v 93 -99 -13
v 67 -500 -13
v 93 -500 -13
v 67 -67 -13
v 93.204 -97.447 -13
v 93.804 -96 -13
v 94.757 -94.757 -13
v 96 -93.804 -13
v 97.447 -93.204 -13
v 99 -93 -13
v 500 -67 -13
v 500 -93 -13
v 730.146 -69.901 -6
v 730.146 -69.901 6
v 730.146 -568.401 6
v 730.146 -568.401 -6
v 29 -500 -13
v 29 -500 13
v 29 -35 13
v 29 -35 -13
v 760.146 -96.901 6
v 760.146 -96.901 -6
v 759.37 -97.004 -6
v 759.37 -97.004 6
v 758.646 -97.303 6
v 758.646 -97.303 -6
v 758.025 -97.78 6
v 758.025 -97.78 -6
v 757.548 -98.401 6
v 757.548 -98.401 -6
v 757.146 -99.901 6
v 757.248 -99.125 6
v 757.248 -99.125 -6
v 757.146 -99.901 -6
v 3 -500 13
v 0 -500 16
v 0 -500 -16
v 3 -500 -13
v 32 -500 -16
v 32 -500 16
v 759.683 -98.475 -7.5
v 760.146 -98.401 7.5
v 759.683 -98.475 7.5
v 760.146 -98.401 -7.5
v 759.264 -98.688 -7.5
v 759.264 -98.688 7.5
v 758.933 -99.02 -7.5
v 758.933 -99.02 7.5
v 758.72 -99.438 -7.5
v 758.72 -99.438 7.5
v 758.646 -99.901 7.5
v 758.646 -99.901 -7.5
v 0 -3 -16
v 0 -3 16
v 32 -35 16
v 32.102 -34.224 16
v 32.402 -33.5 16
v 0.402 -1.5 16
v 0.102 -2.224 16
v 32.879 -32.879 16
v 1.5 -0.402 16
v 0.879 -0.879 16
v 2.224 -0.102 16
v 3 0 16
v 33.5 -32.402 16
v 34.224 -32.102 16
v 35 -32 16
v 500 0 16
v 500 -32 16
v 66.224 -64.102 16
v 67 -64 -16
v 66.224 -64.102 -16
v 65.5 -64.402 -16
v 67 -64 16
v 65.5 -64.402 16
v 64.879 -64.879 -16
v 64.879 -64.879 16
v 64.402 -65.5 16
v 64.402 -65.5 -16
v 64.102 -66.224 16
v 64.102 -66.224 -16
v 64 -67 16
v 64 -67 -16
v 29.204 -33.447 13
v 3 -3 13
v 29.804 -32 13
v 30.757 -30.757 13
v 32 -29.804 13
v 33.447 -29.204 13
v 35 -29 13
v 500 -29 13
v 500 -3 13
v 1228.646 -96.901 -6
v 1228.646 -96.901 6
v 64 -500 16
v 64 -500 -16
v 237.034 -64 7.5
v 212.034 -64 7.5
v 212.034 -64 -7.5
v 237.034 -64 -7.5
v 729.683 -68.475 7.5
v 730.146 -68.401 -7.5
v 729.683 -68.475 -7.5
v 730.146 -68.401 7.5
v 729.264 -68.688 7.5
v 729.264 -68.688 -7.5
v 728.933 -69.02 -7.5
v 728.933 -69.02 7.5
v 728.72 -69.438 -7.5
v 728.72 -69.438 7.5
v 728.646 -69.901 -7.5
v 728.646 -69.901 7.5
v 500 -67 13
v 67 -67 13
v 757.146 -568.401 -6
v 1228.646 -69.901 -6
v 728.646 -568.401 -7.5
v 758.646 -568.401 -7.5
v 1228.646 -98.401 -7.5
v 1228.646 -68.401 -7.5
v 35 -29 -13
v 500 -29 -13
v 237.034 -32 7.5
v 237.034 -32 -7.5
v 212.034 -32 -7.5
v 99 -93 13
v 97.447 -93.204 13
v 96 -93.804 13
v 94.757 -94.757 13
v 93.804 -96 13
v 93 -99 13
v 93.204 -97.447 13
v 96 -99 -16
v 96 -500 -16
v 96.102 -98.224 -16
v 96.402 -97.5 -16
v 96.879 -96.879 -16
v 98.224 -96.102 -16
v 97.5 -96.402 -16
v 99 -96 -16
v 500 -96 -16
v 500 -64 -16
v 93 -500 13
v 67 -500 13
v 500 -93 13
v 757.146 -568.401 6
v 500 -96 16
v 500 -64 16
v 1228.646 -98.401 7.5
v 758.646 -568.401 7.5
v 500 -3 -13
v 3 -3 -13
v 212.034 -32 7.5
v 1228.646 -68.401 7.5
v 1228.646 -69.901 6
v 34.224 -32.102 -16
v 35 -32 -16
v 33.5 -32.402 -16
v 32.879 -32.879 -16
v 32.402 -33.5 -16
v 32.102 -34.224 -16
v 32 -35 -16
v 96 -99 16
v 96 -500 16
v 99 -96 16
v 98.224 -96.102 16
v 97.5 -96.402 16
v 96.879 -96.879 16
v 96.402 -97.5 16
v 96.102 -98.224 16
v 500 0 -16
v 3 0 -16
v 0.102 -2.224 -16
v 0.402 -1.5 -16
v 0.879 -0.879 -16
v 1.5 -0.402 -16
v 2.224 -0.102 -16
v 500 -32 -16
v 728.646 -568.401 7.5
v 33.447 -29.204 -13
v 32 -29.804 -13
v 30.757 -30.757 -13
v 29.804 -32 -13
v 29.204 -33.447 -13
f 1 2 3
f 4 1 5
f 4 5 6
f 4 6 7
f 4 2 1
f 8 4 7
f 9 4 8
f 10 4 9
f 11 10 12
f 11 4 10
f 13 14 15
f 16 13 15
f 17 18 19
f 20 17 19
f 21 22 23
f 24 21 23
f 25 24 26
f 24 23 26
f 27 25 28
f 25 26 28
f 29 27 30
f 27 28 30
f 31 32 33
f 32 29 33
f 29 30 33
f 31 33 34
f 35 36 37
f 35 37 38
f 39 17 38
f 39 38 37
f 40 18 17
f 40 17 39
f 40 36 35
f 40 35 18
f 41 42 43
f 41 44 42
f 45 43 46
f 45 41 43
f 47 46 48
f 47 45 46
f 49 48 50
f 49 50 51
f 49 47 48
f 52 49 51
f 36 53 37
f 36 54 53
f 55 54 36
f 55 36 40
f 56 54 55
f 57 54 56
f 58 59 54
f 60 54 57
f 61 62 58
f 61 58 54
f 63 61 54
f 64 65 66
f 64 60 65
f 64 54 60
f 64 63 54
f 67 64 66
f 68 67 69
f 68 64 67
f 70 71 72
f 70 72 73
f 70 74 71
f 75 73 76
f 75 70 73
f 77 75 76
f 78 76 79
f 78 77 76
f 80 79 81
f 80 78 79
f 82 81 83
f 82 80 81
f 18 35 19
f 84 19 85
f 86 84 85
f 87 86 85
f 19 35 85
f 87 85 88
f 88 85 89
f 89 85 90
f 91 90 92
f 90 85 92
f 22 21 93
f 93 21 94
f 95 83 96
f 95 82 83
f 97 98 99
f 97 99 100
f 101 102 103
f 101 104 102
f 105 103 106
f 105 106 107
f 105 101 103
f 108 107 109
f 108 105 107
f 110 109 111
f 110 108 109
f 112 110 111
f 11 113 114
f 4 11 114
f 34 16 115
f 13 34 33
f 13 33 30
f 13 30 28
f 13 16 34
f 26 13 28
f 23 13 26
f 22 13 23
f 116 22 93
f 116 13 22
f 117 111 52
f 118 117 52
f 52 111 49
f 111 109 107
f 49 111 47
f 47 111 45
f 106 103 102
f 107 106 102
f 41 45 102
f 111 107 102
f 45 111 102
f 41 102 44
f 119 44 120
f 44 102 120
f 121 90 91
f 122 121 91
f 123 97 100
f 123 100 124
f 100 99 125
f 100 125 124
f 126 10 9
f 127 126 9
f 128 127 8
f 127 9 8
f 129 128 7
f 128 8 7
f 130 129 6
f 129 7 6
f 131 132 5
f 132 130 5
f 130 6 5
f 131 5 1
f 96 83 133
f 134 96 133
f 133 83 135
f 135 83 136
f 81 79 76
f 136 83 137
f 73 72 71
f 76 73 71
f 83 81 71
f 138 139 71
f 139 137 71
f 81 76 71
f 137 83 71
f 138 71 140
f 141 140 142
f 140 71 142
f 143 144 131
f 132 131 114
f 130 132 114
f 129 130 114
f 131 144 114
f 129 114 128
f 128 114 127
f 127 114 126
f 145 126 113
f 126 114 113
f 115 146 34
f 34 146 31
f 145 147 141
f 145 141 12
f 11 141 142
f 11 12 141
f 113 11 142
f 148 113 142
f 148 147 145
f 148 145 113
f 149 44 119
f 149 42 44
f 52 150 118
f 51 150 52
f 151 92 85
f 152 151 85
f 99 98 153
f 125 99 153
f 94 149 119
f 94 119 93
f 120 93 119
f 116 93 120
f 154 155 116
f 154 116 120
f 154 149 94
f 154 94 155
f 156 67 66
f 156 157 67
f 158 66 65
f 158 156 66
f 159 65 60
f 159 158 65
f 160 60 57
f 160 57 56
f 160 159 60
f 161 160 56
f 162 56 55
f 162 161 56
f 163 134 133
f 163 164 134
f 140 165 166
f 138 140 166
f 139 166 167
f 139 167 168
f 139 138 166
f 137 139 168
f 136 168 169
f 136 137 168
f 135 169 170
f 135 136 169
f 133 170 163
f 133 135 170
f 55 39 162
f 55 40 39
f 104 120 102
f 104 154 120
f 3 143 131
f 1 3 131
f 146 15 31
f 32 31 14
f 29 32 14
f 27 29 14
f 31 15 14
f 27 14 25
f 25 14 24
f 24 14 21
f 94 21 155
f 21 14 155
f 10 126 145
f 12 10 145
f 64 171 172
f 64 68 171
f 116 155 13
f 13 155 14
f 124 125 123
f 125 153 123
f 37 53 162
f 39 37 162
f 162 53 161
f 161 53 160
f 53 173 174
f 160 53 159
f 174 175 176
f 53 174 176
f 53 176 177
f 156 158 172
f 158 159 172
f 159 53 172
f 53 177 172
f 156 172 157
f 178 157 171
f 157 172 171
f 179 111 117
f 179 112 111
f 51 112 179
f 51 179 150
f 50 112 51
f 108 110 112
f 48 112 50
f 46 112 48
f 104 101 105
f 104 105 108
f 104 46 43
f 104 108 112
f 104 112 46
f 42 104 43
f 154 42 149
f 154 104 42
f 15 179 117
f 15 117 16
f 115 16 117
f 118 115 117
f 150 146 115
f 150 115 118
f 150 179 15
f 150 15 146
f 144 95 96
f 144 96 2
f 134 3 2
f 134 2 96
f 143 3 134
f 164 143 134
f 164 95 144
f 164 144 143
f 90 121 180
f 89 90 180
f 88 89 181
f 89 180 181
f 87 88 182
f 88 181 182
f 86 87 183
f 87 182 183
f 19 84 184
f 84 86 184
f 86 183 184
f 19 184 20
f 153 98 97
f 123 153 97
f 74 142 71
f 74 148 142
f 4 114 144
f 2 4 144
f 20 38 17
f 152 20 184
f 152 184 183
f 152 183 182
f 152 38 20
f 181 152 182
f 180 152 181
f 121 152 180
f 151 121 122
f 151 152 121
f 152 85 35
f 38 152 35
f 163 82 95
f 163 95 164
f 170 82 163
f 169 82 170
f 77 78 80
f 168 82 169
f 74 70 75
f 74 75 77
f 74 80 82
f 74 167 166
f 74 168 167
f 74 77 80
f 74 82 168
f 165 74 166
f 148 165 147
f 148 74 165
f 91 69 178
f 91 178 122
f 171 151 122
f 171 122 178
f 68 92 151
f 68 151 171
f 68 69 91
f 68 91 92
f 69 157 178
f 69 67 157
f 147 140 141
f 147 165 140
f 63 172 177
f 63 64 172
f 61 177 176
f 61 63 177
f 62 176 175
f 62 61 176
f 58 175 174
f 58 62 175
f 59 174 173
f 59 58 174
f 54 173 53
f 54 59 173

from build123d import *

# Parameters (mm, degrees)
F1_DEPTH      = 16
F1_DEPTH_BACK = 16
F2_R          = 3
F2_2_R        = 3
F3_T          = 3
F3_2_T        = 3
F4_W          = 25
F4_H          = 32
F5_DEPTH      = 7.5
F5_DEPTH_BACK = 7.5
F7_DEPTH      = 7.5
F7_DEPTH_BACK = 7.5
F8_R          = 1.5
F9_T          = 1.5


# Not quite as in the source:
# - a shell that OpenCascade refuses in one call is made with other operations: the cavity is built on its own and cut out


with BuildPart() as f1:
    # F0 (on Top) → F1 (new body, two sides)
    with BuildSketch(Plane.XY) as f1_sk:
        Polygon((500, -64), (64, -64), (64, -500), (96, -500), (96, -96), (500, -96), align=None)
    extrude(amount=F1_DEPTH)
    extrude(f1_sk.sketch, amount=-F1_DEPTH_BACK)

    # F2
    f2_edges = [f1.edges().sort_by_distance(p)[0] for p in [
        (64, -64, 0),
        (96, -96, 0),
    ]]
    fillet(f2_edges, radius=F2_R)

    # F3#2: shell of thickness 3, made by hand


with BuildPart() as f1b:
    # F0 (on Top) → F1, piece 2 (new body, two sides)
    with BuildSketch(Plane.XY) as f1_2_sk:
        Polygon((500, 0), (0, 0), (0, -500), (32, -500), (32, -32), (500, -32), align=None)
    extrude(amount=F1_DEPTH)
    extrude(f1_2_sk.sketch, amount=-F1_DEPTH_BACK)

    # F2#2
    f2_2_edges = [f1b.edges().sort_by_distance(p)[0] for p in [
        (0, 0, 0),
        (32, -32, 0),
    ]]
    fillet(f2_2_edges, radius=F2_2_R)

    # F3: shell of thickness 3, made by hand


with BuildPart() as f3_core1:
    # F3_t2: copy of F1b
    add(f1b.part)

    # the walls: a layer under each face that stays
    f3_faces = [f3_core1.faces().sort_by_distance(p)[0] for p in [
        (251.5, 0, 0),
        (16.6666666667, -483.3333333333, 16),
        (16.6666666667, -483.3333333333, -16),
        (0, -251.5, 0),
        (267.5, -32, 0),
        (32.8786796564, -32.8786796564, 0),
        (32, -267.5, 0),
    ]]
    thicken(f3_faces, amount=-F3_T, mode=Mode.SUBTRACT)


with BuildPart() as f1b_1:
    add(f1b.part)

    # what is left inside the walls is the cavity
    f3_cavity = [f3_core1.part.solids().sort_by_distance(p)[0] for p in [
        (18.53125, -205.481481, -12.97),
    ]]
    add(f3_cavity, mode=Mode.SUBTRACT)


with BuildPart() as f3_2_core1:
    # F3_2_t2: copy of F1
    add(f1.part)

    # the walls: a layer under each face that stays
    f3_2_faces = [f3_2_core1.faces().sort_by_distance(p)[0] for p in [
        (283.5, -64, 0),
        (95.1428571429, -468.8571428571, 16),
        (95.1428571429, -468.8571428571, -16),
        (64, -283.5, 0),
        (299.5, -96, 0),
        (96.8786796564, -96.8786796564, 0),
        (96, -299.5, 0),
    ]]
    thicken(f3_2_faces, amount=-F3_2_T, mode=Mode.SUBTRACT)


with BuildPart() as f1_1:
    add(f1.part)

    # what is left inside the walls is the cavity
    f3_2_cavity = [f3_2_core1.part.solids().sort_by_distance(p)[0] for p in [
        (80.53125, -243.407407, -12.97),
    ]]
    add(f3_2_cavity, mode=Mode.SUBTRACT)


with BuildPart() as f5:
    # F4 (on Top) → F5 (new body, two sides)
    with BuildSketch(Plane.XY) as f5_sk:
        with Locations((224.534201622, -48)):
            Rectangle(F4_W, F4_H)
    extrude(amount=F5_DEPTH)
    extrude(f5_sk.sketch, amount=-F5_DEPTH_BACK)


with BuildPart() as f7:
    # F6 (on Top) → F7 (new body, two sides)
    with BuildSketch(Plane.XY) as f7_sk:
        Polygon((1228.6461293697, -68.4013846497), (728.6461293697, -68.4013846497), (728.6461293697, -568.4013846497), (758.6461293697, -568.4013846497), (758.6461293697, -98.4013846497), (1228.6461293697, -98.4013846497), align=None)
    extrude(amount=F7_DEPTH)
    extrude(f7_sk.sketch, amount=-F7_DEPTH_BACK)

    # F8
    f8_edges = [f7.edges().sort_by_distance(p)[0] for p in [
        (728.646129, -68.401385, 0),
        (758.646129, -98.401385, 0),
    ]]
    fillet(f8_edges, radius=F8_R)

    # F9: shell of thickness 1.5, made by hand


with BuildPart() as f9_core1:
    # F9_t2: copy of F7
    add(f7.part)

    # the walls: a layer under each face that stays
    f9_faces = [f9_core1.faces().sort_by_distance(p)[0] for p in [
        (979.3961293697, -68.4013846497, 0),
        (745.3127960364, -551.7347179831, 7.5),
        (745.3127960364, -551.7347179831, -7.5),
        (728.6461293697, -319.1513846497, 0),
        (994.3961293697, -98.4013846497, 0),
        (759.085469198, -98.840724478, 0),
        (758.6461293697, -334.1513846497, 0),
    ]]
    thicken(f9_faces, amount=-F9_T, mode=Mode.SUBTRACT)


with BuildPart() as f7_1:
    add(f7.part)

    # what is left inside the walls is the cavity
    f9_cavity = [f9_core1.part.solids().sort_by_distance(p)[0] for p in [
        (745.724254, -272.993977, -5.985),
    ]]
    add(f9_cavity, mode=Mode.SUBTRACT)


solid = Compound([f1b_1.part, f1_1.part, f5.part, f7_1.part])
